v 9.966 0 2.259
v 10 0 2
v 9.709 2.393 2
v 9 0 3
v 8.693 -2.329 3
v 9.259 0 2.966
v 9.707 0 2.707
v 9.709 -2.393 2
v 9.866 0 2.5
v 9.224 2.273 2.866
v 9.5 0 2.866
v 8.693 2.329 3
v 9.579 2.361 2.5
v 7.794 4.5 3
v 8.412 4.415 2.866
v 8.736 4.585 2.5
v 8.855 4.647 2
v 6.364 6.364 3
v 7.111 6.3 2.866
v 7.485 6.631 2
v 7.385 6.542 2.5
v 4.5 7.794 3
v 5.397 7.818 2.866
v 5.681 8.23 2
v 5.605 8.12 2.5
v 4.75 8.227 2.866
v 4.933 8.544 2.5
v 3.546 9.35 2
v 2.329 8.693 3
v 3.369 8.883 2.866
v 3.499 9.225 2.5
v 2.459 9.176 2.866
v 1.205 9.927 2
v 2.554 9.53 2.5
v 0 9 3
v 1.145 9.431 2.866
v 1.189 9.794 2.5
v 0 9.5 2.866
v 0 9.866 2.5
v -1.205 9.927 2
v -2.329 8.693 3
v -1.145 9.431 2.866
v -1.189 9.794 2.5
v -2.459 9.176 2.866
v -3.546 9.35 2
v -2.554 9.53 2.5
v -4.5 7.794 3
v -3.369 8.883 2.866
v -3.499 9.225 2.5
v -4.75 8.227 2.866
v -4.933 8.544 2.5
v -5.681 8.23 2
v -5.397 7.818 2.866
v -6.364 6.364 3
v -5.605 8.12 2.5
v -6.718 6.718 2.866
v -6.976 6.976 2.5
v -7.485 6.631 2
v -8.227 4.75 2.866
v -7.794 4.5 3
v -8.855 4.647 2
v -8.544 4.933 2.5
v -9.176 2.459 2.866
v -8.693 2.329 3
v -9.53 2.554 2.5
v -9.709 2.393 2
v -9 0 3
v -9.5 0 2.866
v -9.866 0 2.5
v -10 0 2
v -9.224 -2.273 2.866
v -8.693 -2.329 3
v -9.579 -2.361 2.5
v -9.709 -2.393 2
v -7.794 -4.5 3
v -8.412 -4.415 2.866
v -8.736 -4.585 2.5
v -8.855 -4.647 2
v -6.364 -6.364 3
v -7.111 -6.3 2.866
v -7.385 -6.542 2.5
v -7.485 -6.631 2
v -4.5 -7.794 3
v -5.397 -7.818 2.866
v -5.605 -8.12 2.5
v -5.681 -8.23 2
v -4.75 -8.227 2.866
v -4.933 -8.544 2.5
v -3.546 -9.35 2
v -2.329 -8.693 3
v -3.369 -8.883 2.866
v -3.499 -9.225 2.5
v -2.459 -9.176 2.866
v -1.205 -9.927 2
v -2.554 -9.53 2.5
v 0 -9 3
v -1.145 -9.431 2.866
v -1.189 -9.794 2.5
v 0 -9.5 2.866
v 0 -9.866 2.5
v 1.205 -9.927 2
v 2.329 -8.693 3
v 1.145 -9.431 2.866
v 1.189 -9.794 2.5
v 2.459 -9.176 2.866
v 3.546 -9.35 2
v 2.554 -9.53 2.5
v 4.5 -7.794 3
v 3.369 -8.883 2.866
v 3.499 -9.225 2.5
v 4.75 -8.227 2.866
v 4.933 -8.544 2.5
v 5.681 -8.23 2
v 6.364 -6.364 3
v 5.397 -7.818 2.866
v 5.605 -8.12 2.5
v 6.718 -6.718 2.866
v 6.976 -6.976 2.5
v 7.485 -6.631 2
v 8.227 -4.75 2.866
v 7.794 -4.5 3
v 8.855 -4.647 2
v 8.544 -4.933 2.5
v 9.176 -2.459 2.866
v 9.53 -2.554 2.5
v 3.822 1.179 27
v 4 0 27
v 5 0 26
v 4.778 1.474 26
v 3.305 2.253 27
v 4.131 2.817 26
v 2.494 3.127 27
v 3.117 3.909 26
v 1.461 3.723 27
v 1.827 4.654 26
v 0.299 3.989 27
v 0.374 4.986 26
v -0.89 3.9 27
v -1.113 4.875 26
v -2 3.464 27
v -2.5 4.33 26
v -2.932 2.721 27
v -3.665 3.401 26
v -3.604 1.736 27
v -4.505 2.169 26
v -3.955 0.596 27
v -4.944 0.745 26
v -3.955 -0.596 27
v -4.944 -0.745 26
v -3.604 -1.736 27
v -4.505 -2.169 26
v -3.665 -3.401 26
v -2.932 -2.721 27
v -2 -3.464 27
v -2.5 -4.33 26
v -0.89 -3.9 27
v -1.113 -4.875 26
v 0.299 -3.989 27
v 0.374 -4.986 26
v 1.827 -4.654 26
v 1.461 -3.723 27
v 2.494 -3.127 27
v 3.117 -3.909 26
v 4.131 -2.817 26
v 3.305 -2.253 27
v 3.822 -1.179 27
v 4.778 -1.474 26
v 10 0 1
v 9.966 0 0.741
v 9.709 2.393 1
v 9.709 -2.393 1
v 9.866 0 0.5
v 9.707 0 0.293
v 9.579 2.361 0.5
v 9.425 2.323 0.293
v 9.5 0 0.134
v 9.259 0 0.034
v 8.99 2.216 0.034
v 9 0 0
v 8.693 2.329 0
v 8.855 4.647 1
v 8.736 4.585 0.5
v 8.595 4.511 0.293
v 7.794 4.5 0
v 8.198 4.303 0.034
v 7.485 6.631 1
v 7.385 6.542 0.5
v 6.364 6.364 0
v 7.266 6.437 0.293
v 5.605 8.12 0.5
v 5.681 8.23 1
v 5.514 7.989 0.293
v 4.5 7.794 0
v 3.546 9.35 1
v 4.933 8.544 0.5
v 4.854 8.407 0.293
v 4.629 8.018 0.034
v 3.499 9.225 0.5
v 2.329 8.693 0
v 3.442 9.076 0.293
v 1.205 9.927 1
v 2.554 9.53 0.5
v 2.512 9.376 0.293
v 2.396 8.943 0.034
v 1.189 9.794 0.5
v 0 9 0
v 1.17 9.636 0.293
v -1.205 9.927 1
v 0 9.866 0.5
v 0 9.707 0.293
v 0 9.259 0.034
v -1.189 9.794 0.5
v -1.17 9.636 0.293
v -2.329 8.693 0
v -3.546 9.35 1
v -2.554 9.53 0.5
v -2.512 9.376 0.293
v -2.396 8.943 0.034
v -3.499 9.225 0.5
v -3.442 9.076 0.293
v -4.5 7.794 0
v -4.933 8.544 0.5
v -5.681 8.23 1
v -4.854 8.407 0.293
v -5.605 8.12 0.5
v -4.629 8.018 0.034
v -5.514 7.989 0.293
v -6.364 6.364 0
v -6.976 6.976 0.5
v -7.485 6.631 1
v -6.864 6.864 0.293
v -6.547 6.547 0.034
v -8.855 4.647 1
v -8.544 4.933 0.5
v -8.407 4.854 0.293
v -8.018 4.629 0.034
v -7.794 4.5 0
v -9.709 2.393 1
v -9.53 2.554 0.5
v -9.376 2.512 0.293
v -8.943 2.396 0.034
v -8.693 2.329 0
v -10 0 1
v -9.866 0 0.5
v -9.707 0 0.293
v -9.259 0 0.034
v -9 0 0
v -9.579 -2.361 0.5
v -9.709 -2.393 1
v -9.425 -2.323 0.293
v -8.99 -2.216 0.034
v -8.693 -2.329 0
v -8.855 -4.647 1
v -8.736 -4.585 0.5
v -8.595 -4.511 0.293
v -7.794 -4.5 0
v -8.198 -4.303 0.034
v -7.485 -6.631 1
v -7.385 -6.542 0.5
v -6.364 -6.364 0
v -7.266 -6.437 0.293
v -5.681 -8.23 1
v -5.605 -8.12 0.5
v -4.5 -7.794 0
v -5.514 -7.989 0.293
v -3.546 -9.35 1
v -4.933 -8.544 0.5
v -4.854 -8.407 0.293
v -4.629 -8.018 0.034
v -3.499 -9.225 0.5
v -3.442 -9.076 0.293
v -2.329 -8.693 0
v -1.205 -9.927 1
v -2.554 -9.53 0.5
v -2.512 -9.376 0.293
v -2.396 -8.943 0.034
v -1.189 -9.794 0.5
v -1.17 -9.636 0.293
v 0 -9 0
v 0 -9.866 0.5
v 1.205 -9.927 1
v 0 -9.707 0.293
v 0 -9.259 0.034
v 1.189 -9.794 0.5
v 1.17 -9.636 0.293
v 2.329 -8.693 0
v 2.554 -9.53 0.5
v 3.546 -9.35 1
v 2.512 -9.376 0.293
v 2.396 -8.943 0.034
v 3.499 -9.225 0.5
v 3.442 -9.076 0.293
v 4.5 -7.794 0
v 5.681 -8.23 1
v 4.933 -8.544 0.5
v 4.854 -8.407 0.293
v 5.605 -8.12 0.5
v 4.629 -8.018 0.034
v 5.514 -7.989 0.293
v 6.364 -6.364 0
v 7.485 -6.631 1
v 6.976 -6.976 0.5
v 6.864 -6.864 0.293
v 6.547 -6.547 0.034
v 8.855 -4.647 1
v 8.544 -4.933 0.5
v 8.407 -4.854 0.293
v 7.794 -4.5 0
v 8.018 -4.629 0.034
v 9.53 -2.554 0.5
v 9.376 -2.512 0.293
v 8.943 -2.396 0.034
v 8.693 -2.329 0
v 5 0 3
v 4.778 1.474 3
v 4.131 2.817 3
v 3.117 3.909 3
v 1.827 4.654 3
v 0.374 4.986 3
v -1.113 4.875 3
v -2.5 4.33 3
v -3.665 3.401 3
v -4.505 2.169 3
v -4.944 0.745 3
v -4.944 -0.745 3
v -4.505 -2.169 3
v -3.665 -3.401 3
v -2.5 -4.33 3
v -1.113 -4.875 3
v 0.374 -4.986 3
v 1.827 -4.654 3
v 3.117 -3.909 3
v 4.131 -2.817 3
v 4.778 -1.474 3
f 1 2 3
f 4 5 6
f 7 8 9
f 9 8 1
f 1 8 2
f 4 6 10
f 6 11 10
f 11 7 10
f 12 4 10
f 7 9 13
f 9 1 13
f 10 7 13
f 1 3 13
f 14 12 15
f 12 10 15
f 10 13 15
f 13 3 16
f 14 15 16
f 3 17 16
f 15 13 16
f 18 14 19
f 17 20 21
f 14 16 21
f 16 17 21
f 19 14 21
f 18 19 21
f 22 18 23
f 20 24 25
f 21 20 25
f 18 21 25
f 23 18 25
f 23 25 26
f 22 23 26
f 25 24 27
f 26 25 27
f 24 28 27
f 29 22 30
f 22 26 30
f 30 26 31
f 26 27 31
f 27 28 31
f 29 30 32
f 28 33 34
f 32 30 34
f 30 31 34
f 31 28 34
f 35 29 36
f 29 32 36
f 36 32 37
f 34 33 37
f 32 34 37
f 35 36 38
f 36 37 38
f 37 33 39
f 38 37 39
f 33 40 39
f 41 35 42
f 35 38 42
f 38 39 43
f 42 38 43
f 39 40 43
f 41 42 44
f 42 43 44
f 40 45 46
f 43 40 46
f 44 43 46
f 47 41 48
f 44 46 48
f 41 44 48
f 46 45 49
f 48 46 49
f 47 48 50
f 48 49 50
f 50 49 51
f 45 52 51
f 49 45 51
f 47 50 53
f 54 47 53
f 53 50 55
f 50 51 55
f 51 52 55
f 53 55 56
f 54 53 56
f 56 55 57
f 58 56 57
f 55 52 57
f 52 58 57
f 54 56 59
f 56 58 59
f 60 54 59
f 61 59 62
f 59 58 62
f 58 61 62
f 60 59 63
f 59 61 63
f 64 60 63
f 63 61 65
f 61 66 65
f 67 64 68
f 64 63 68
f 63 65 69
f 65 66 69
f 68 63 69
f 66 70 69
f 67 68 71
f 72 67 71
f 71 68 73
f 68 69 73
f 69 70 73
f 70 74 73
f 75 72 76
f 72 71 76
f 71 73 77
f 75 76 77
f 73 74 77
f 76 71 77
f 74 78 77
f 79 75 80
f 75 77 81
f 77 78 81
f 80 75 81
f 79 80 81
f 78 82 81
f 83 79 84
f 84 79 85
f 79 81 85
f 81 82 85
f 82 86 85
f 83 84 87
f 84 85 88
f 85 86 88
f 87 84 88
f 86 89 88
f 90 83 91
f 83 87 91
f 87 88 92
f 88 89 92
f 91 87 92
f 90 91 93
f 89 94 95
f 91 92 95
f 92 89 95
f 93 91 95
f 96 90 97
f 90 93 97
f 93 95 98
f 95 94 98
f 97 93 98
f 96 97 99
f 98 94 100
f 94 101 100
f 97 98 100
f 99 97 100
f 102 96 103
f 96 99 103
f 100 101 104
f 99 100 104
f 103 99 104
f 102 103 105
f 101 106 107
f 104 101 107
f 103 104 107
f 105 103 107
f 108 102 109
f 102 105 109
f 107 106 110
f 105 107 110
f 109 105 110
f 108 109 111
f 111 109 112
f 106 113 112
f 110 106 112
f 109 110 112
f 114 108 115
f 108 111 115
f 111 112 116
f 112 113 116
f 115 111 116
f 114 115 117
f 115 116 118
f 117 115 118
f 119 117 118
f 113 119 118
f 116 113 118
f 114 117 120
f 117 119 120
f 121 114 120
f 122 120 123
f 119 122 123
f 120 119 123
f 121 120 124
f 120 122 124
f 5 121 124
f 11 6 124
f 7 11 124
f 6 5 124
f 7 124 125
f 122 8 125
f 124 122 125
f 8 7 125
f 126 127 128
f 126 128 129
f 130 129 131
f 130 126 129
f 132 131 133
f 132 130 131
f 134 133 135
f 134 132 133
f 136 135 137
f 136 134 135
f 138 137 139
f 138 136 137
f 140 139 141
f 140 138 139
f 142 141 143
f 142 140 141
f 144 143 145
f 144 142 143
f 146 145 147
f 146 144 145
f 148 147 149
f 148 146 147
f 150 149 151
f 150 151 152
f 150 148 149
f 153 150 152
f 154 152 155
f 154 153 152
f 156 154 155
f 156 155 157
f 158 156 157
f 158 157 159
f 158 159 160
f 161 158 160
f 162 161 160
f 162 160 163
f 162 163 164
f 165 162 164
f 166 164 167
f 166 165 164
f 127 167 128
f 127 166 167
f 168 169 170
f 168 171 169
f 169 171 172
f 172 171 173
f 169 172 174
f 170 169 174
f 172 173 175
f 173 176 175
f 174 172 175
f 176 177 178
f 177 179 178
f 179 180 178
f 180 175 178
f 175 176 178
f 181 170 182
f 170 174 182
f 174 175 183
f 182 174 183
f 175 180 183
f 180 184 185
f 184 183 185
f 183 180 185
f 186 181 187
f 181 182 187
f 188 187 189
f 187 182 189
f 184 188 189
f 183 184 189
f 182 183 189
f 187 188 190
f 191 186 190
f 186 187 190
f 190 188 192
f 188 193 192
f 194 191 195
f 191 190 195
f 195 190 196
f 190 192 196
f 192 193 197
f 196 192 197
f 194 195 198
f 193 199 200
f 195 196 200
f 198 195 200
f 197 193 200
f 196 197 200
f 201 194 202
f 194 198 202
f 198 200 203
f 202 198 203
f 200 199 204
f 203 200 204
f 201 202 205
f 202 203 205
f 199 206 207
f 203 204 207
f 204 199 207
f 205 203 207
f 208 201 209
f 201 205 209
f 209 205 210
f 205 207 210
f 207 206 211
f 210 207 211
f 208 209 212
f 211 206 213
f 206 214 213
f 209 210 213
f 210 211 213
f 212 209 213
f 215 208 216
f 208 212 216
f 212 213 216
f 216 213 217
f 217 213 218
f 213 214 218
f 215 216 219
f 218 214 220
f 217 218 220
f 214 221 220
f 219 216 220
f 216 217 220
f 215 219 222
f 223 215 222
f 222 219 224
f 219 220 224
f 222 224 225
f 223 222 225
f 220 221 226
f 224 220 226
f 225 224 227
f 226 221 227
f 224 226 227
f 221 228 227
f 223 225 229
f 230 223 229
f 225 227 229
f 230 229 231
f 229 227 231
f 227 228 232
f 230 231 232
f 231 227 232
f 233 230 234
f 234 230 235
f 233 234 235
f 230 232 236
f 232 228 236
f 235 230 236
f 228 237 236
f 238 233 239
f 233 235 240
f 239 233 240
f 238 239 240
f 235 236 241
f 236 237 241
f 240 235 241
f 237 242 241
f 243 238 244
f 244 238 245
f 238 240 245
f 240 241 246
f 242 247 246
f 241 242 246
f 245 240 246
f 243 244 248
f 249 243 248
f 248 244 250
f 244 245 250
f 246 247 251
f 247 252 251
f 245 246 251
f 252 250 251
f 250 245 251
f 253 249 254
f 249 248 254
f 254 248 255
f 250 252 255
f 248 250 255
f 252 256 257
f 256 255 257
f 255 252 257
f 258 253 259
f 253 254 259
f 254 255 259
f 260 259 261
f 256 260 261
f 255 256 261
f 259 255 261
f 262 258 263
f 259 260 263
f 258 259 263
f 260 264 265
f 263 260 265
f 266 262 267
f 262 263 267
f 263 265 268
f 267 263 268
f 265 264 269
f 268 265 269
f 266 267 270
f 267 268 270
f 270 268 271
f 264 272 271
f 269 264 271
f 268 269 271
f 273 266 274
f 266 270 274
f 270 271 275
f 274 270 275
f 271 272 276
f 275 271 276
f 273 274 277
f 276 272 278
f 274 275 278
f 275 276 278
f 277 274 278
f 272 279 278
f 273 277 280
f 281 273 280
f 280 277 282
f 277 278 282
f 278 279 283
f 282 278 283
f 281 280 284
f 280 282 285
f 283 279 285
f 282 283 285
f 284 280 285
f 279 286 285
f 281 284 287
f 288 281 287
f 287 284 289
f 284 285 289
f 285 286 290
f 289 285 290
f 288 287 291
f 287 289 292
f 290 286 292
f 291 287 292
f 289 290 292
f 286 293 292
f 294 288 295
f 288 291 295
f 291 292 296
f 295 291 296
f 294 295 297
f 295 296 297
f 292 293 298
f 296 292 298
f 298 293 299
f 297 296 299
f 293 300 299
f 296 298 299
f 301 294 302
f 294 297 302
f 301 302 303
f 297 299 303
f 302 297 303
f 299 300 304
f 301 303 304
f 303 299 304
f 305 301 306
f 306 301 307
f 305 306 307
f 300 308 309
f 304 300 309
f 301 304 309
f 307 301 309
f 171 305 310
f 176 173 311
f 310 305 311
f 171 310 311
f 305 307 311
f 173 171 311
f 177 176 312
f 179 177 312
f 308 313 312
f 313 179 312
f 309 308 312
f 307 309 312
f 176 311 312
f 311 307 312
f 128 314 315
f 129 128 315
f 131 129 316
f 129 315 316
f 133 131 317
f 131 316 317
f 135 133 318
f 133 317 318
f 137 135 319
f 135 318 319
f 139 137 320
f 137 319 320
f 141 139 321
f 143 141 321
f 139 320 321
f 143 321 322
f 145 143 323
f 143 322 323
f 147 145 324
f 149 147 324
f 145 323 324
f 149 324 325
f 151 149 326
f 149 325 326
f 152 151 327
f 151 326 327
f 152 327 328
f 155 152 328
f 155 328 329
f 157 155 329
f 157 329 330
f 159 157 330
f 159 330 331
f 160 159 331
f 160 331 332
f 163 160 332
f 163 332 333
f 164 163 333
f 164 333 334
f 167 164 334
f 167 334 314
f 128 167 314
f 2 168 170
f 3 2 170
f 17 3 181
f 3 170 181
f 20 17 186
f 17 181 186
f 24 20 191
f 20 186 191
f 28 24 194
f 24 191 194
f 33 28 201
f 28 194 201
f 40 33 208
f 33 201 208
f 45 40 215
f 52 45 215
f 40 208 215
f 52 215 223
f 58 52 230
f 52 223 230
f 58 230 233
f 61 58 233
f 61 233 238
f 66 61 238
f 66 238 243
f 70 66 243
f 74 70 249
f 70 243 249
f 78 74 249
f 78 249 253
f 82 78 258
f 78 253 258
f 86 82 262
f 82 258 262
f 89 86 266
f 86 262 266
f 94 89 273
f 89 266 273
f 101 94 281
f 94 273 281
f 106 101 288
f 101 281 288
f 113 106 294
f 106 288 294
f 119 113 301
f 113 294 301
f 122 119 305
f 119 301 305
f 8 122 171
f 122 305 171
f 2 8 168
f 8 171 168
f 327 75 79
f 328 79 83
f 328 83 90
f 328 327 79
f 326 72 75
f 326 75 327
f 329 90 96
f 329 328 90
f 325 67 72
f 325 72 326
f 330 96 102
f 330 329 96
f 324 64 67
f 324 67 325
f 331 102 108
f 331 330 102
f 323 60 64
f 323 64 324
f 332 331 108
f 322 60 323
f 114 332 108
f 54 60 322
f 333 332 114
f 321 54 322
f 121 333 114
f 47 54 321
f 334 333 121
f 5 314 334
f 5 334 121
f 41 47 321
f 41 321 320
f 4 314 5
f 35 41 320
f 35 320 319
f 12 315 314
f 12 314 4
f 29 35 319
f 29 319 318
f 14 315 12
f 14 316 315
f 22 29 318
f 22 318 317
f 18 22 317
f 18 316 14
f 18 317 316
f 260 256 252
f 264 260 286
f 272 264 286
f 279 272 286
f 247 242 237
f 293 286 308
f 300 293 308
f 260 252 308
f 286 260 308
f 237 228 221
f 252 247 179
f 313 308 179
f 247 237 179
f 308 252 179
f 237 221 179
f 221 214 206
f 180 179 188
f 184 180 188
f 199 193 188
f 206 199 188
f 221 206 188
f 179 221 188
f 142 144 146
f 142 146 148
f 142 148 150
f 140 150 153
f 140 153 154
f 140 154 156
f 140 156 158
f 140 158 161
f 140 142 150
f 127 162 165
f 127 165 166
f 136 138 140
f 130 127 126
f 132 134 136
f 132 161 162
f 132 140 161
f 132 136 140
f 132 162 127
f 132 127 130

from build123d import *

# Parameters (mm, degrees)
SKETCH1_R           = 10
BOSS_EXTRUDE1_DEPTH = 3
SKETCH1_3_R         = 5
BOSS_EXTRUDE2_DEPTH = 27
CHAMFER1_SIZE       = 1
FILLET1_R           = 1


with BuildPart() as part:
    # Sketch1 → Boss-Extrude1 (new body)
    with BuildSketch(Plane.XY):
        Circle(SKETCH1_R)
    extrude(amount=BOSS_EXTRUDE1_DEPTH)

    # Sketch1<3> → Boss-Extrude2 (add)
    with BuildSketch(Plane.XY):
        Circle(SKETCH1_3_R)
    extrude(amount=BOSS_EXTRUDE2_DEPTH)

    # Chamfer1
    chamfer1_edges = [part.edges().sort_by_distance(p)[0] for p in [
        (-5, 0, 27),
    ]]
    chamfer(chamfer1_edges, length=CHAMFER1_SIZE)

    # Fillet1
    fillet1_edges = [part.edges().sort_by_distance(p)[0] for p in [
        (-10, 0, 3),
        (-10, 0, 0),
    ]]
    fillet(fillet1_edges, radius=FILLET1_R)


solid = part.part
